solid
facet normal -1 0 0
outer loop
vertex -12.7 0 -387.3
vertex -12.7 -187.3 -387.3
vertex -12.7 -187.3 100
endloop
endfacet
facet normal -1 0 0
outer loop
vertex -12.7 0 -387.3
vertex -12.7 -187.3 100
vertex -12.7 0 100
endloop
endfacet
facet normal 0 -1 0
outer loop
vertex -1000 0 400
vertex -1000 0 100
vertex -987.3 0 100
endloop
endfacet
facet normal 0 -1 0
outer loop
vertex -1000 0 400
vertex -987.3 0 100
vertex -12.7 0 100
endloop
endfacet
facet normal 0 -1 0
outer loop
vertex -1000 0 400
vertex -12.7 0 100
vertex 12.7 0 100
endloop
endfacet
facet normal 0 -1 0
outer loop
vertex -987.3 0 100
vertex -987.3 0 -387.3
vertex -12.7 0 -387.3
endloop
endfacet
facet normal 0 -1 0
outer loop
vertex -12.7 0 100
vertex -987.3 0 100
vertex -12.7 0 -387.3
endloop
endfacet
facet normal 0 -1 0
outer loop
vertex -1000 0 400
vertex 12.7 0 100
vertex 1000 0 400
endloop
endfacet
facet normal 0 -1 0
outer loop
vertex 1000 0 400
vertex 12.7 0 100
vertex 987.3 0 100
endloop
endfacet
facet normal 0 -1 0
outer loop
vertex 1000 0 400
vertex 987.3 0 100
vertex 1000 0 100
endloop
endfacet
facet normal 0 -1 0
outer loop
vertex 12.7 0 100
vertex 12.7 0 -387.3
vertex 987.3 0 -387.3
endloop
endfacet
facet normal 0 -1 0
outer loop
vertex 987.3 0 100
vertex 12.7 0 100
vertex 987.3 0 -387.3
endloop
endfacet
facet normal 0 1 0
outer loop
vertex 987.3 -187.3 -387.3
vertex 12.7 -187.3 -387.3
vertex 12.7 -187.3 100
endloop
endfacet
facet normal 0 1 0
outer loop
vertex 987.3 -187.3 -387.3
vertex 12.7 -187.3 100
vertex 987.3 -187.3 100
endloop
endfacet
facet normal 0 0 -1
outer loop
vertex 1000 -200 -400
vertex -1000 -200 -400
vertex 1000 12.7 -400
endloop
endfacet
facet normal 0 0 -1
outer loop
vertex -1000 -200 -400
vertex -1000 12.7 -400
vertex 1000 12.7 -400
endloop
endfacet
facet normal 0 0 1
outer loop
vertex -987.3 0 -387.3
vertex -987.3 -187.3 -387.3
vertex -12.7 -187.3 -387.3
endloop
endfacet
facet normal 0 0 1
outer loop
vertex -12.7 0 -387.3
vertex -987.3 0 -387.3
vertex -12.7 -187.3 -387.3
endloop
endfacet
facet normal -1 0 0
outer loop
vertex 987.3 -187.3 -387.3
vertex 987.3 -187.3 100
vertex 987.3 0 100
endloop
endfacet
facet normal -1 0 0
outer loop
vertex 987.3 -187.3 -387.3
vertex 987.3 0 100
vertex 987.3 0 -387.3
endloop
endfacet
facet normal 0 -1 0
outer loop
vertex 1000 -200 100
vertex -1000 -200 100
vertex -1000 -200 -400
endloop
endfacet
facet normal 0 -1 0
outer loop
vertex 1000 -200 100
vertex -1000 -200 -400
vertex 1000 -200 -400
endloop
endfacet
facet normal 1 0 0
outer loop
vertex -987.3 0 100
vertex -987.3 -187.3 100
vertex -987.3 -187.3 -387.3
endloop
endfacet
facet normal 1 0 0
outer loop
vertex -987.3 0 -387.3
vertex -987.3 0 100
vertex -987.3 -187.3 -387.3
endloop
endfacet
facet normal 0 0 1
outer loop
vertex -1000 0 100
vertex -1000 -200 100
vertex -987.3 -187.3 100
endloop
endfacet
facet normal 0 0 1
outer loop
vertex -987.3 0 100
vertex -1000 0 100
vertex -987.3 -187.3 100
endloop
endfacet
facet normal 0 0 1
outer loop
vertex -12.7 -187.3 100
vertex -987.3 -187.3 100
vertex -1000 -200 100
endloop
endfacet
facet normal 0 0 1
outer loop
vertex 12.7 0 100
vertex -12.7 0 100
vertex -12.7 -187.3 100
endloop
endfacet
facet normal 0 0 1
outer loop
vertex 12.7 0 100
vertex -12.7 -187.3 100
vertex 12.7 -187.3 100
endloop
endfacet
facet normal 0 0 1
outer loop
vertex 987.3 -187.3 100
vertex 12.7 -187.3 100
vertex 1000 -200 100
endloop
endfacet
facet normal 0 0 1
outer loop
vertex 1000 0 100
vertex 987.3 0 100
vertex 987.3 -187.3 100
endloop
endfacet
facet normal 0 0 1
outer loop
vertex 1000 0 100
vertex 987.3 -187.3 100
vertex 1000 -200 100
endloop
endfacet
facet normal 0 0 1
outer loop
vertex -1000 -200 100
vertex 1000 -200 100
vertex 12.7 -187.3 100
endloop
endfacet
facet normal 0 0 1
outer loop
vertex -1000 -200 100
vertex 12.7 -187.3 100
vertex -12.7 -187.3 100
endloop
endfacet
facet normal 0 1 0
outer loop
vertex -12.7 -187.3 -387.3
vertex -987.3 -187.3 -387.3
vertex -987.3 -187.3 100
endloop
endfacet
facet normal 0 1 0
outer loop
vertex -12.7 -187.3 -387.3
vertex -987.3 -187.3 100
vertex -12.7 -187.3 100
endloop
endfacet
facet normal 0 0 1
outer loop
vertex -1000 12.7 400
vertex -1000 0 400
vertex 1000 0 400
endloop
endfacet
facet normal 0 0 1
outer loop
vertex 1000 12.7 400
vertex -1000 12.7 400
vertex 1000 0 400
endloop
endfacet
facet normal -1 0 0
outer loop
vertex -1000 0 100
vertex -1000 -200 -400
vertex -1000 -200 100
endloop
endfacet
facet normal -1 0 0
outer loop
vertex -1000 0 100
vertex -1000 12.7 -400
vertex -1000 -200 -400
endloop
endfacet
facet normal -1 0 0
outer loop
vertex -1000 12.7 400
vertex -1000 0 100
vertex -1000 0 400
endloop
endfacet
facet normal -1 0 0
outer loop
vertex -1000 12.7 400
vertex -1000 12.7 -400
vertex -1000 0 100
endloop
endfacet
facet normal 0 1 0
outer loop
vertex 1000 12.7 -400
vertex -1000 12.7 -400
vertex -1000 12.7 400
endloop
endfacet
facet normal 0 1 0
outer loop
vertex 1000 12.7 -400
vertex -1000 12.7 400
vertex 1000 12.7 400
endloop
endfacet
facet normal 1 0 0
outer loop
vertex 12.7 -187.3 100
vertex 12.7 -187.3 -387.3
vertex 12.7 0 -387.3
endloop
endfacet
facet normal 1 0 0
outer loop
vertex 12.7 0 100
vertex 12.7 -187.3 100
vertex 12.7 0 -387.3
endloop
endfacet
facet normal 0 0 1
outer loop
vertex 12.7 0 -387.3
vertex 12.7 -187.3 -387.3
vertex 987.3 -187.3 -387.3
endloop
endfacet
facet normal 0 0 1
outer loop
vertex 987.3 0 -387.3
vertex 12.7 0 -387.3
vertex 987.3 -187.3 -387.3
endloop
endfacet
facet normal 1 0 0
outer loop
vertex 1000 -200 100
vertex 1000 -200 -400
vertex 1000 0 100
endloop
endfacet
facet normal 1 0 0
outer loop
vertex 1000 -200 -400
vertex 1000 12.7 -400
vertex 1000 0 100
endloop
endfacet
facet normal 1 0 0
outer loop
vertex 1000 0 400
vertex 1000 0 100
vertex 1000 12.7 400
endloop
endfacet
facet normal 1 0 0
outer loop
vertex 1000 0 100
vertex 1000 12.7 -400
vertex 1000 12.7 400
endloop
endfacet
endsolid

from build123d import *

# Parameters (mm, degrees)
SKETCH1_W           = 2000
SKETCH1_H           = 800
BOSS_EXTRUDE1_DEPTH = 12.7
SKETCH2_W           = 2000
SKETCH2_H           = 500
BOSS_EXTRUDE2_DEPTH = 200
SHELL1_START        = -187.3
SHELL1_OUTLINE_W    = 1974.6
SHELL1_OUTLINE_H    = 487.3
SHELL1_DEPTH        = 187.3
SKETCH4_W           = 25.4
SKETCH4_H           = 187.3
BOSS_EXTRUDE3_DEPTH = 487.3


# Read off the part's stored shape, not the designer's step: Shell1
with BuildPart() as part:
    # Sketch1 → Boss-Extrude1 (new body)
    with BuildSketch(Plane(origin=(0, 0, 0), x_dir=(1, 0, 0), z_dir=(0, 1, 0))):
        Rectangle(SKETCH1_W, SKETCH1_H)
    extrude(amount=BOSS_EXTRUDE1_DEPTH)

    # Sketch2 → Boss-Extrude2 (add)
    with BuildSketch(Plane.XZ):
        with Locations((0, -150)):
            Rectangle(SKETCH2_W, SKETCH2_H)
    extrude(amount=BOSS_EXTRUDE2_DEPTH)

    # Shell1 outline → Shell1 (cut)
    with BuildSketch(Plane(origin=(0, 0, 0), x_dir=(1, 0, 0), z_dir=(0, 1, 0)).offset(SHELL1_START)):
        with Locations((0, 143.65)):
            Rectangle(SHELL1_OUTLINE_W, SHELL1_OUTLINE_H)
    extrude(amount=SHELL1_DEPTH, mode=Mode.SUBTRACT)

    # Sketch4 → Boss-Extrude3 (add)
    with BuildSketch(Plane.XY.offset(-387.3)):
        with Locations((0, -93.65)):
            Rectangle(SKETCH4_W, SKETCH4_H)
    extrude(amount=BOSS_EXTRUDE3_DEPTH)


solid = part.part
